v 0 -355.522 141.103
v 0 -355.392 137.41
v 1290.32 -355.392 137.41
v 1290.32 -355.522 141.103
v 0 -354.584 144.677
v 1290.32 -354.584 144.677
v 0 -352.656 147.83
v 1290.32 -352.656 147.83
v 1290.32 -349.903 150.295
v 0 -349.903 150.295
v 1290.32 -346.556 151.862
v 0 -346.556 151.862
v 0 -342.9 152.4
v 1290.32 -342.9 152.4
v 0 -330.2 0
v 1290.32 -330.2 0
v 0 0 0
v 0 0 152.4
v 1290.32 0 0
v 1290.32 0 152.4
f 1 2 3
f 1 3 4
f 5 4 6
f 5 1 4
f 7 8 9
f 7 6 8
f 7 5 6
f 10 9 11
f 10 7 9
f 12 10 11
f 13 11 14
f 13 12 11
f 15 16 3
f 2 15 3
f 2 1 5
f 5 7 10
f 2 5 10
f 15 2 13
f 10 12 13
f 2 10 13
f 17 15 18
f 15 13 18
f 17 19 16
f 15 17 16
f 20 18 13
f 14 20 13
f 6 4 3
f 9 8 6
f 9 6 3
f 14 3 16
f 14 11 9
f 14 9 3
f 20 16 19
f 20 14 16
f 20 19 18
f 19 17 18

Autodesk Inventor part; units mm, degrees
ref_plane "YZ Plane" through (0, 0, 0) normal (1, 0, 0) x (0, 1, 0)
ref_plane "XZ Plane" through (0, 0, 0) normal (0, 1, 0) x (-1, 0, 0)
ref_plane "XY Plane" through (0, 0, 0) normal (0, 0, 1) x (1, 0, 0)
sketch "Sketch2" plane through (0, 0, 0) normal (1, 0, 0) x (0, 1, 0)
  line L0 (0, 0) -> (0, 152.4)
  line L1 (0, 0) -> (-330.2, 0)
  line L2 (0, 152.4) -> (-342.9, 152.4)
  line L3 (-342.9, 152.4) -> (-342.9, 139.7) construction
  arc A0 (-342.9, 152.4) -> (-355.3918, 137.4098) centre (-342.9, 139.7) ccw
  line L4 (-330.2, 0) -> (-355.3918, 137.4098)
  point P0 (355.6, 152.4)
  dimension "d0" = 152.4
  dimension "d14" = 342.9
  dimension "d15" = 330.2
  dimension "d16" = 12.7
  dimension "d17" = 139.7
extrude "Extrusion1" add sketch "Sketch2" along normal blind 1290.32
properties part number "A" material "Granite, Cut, Polished"
